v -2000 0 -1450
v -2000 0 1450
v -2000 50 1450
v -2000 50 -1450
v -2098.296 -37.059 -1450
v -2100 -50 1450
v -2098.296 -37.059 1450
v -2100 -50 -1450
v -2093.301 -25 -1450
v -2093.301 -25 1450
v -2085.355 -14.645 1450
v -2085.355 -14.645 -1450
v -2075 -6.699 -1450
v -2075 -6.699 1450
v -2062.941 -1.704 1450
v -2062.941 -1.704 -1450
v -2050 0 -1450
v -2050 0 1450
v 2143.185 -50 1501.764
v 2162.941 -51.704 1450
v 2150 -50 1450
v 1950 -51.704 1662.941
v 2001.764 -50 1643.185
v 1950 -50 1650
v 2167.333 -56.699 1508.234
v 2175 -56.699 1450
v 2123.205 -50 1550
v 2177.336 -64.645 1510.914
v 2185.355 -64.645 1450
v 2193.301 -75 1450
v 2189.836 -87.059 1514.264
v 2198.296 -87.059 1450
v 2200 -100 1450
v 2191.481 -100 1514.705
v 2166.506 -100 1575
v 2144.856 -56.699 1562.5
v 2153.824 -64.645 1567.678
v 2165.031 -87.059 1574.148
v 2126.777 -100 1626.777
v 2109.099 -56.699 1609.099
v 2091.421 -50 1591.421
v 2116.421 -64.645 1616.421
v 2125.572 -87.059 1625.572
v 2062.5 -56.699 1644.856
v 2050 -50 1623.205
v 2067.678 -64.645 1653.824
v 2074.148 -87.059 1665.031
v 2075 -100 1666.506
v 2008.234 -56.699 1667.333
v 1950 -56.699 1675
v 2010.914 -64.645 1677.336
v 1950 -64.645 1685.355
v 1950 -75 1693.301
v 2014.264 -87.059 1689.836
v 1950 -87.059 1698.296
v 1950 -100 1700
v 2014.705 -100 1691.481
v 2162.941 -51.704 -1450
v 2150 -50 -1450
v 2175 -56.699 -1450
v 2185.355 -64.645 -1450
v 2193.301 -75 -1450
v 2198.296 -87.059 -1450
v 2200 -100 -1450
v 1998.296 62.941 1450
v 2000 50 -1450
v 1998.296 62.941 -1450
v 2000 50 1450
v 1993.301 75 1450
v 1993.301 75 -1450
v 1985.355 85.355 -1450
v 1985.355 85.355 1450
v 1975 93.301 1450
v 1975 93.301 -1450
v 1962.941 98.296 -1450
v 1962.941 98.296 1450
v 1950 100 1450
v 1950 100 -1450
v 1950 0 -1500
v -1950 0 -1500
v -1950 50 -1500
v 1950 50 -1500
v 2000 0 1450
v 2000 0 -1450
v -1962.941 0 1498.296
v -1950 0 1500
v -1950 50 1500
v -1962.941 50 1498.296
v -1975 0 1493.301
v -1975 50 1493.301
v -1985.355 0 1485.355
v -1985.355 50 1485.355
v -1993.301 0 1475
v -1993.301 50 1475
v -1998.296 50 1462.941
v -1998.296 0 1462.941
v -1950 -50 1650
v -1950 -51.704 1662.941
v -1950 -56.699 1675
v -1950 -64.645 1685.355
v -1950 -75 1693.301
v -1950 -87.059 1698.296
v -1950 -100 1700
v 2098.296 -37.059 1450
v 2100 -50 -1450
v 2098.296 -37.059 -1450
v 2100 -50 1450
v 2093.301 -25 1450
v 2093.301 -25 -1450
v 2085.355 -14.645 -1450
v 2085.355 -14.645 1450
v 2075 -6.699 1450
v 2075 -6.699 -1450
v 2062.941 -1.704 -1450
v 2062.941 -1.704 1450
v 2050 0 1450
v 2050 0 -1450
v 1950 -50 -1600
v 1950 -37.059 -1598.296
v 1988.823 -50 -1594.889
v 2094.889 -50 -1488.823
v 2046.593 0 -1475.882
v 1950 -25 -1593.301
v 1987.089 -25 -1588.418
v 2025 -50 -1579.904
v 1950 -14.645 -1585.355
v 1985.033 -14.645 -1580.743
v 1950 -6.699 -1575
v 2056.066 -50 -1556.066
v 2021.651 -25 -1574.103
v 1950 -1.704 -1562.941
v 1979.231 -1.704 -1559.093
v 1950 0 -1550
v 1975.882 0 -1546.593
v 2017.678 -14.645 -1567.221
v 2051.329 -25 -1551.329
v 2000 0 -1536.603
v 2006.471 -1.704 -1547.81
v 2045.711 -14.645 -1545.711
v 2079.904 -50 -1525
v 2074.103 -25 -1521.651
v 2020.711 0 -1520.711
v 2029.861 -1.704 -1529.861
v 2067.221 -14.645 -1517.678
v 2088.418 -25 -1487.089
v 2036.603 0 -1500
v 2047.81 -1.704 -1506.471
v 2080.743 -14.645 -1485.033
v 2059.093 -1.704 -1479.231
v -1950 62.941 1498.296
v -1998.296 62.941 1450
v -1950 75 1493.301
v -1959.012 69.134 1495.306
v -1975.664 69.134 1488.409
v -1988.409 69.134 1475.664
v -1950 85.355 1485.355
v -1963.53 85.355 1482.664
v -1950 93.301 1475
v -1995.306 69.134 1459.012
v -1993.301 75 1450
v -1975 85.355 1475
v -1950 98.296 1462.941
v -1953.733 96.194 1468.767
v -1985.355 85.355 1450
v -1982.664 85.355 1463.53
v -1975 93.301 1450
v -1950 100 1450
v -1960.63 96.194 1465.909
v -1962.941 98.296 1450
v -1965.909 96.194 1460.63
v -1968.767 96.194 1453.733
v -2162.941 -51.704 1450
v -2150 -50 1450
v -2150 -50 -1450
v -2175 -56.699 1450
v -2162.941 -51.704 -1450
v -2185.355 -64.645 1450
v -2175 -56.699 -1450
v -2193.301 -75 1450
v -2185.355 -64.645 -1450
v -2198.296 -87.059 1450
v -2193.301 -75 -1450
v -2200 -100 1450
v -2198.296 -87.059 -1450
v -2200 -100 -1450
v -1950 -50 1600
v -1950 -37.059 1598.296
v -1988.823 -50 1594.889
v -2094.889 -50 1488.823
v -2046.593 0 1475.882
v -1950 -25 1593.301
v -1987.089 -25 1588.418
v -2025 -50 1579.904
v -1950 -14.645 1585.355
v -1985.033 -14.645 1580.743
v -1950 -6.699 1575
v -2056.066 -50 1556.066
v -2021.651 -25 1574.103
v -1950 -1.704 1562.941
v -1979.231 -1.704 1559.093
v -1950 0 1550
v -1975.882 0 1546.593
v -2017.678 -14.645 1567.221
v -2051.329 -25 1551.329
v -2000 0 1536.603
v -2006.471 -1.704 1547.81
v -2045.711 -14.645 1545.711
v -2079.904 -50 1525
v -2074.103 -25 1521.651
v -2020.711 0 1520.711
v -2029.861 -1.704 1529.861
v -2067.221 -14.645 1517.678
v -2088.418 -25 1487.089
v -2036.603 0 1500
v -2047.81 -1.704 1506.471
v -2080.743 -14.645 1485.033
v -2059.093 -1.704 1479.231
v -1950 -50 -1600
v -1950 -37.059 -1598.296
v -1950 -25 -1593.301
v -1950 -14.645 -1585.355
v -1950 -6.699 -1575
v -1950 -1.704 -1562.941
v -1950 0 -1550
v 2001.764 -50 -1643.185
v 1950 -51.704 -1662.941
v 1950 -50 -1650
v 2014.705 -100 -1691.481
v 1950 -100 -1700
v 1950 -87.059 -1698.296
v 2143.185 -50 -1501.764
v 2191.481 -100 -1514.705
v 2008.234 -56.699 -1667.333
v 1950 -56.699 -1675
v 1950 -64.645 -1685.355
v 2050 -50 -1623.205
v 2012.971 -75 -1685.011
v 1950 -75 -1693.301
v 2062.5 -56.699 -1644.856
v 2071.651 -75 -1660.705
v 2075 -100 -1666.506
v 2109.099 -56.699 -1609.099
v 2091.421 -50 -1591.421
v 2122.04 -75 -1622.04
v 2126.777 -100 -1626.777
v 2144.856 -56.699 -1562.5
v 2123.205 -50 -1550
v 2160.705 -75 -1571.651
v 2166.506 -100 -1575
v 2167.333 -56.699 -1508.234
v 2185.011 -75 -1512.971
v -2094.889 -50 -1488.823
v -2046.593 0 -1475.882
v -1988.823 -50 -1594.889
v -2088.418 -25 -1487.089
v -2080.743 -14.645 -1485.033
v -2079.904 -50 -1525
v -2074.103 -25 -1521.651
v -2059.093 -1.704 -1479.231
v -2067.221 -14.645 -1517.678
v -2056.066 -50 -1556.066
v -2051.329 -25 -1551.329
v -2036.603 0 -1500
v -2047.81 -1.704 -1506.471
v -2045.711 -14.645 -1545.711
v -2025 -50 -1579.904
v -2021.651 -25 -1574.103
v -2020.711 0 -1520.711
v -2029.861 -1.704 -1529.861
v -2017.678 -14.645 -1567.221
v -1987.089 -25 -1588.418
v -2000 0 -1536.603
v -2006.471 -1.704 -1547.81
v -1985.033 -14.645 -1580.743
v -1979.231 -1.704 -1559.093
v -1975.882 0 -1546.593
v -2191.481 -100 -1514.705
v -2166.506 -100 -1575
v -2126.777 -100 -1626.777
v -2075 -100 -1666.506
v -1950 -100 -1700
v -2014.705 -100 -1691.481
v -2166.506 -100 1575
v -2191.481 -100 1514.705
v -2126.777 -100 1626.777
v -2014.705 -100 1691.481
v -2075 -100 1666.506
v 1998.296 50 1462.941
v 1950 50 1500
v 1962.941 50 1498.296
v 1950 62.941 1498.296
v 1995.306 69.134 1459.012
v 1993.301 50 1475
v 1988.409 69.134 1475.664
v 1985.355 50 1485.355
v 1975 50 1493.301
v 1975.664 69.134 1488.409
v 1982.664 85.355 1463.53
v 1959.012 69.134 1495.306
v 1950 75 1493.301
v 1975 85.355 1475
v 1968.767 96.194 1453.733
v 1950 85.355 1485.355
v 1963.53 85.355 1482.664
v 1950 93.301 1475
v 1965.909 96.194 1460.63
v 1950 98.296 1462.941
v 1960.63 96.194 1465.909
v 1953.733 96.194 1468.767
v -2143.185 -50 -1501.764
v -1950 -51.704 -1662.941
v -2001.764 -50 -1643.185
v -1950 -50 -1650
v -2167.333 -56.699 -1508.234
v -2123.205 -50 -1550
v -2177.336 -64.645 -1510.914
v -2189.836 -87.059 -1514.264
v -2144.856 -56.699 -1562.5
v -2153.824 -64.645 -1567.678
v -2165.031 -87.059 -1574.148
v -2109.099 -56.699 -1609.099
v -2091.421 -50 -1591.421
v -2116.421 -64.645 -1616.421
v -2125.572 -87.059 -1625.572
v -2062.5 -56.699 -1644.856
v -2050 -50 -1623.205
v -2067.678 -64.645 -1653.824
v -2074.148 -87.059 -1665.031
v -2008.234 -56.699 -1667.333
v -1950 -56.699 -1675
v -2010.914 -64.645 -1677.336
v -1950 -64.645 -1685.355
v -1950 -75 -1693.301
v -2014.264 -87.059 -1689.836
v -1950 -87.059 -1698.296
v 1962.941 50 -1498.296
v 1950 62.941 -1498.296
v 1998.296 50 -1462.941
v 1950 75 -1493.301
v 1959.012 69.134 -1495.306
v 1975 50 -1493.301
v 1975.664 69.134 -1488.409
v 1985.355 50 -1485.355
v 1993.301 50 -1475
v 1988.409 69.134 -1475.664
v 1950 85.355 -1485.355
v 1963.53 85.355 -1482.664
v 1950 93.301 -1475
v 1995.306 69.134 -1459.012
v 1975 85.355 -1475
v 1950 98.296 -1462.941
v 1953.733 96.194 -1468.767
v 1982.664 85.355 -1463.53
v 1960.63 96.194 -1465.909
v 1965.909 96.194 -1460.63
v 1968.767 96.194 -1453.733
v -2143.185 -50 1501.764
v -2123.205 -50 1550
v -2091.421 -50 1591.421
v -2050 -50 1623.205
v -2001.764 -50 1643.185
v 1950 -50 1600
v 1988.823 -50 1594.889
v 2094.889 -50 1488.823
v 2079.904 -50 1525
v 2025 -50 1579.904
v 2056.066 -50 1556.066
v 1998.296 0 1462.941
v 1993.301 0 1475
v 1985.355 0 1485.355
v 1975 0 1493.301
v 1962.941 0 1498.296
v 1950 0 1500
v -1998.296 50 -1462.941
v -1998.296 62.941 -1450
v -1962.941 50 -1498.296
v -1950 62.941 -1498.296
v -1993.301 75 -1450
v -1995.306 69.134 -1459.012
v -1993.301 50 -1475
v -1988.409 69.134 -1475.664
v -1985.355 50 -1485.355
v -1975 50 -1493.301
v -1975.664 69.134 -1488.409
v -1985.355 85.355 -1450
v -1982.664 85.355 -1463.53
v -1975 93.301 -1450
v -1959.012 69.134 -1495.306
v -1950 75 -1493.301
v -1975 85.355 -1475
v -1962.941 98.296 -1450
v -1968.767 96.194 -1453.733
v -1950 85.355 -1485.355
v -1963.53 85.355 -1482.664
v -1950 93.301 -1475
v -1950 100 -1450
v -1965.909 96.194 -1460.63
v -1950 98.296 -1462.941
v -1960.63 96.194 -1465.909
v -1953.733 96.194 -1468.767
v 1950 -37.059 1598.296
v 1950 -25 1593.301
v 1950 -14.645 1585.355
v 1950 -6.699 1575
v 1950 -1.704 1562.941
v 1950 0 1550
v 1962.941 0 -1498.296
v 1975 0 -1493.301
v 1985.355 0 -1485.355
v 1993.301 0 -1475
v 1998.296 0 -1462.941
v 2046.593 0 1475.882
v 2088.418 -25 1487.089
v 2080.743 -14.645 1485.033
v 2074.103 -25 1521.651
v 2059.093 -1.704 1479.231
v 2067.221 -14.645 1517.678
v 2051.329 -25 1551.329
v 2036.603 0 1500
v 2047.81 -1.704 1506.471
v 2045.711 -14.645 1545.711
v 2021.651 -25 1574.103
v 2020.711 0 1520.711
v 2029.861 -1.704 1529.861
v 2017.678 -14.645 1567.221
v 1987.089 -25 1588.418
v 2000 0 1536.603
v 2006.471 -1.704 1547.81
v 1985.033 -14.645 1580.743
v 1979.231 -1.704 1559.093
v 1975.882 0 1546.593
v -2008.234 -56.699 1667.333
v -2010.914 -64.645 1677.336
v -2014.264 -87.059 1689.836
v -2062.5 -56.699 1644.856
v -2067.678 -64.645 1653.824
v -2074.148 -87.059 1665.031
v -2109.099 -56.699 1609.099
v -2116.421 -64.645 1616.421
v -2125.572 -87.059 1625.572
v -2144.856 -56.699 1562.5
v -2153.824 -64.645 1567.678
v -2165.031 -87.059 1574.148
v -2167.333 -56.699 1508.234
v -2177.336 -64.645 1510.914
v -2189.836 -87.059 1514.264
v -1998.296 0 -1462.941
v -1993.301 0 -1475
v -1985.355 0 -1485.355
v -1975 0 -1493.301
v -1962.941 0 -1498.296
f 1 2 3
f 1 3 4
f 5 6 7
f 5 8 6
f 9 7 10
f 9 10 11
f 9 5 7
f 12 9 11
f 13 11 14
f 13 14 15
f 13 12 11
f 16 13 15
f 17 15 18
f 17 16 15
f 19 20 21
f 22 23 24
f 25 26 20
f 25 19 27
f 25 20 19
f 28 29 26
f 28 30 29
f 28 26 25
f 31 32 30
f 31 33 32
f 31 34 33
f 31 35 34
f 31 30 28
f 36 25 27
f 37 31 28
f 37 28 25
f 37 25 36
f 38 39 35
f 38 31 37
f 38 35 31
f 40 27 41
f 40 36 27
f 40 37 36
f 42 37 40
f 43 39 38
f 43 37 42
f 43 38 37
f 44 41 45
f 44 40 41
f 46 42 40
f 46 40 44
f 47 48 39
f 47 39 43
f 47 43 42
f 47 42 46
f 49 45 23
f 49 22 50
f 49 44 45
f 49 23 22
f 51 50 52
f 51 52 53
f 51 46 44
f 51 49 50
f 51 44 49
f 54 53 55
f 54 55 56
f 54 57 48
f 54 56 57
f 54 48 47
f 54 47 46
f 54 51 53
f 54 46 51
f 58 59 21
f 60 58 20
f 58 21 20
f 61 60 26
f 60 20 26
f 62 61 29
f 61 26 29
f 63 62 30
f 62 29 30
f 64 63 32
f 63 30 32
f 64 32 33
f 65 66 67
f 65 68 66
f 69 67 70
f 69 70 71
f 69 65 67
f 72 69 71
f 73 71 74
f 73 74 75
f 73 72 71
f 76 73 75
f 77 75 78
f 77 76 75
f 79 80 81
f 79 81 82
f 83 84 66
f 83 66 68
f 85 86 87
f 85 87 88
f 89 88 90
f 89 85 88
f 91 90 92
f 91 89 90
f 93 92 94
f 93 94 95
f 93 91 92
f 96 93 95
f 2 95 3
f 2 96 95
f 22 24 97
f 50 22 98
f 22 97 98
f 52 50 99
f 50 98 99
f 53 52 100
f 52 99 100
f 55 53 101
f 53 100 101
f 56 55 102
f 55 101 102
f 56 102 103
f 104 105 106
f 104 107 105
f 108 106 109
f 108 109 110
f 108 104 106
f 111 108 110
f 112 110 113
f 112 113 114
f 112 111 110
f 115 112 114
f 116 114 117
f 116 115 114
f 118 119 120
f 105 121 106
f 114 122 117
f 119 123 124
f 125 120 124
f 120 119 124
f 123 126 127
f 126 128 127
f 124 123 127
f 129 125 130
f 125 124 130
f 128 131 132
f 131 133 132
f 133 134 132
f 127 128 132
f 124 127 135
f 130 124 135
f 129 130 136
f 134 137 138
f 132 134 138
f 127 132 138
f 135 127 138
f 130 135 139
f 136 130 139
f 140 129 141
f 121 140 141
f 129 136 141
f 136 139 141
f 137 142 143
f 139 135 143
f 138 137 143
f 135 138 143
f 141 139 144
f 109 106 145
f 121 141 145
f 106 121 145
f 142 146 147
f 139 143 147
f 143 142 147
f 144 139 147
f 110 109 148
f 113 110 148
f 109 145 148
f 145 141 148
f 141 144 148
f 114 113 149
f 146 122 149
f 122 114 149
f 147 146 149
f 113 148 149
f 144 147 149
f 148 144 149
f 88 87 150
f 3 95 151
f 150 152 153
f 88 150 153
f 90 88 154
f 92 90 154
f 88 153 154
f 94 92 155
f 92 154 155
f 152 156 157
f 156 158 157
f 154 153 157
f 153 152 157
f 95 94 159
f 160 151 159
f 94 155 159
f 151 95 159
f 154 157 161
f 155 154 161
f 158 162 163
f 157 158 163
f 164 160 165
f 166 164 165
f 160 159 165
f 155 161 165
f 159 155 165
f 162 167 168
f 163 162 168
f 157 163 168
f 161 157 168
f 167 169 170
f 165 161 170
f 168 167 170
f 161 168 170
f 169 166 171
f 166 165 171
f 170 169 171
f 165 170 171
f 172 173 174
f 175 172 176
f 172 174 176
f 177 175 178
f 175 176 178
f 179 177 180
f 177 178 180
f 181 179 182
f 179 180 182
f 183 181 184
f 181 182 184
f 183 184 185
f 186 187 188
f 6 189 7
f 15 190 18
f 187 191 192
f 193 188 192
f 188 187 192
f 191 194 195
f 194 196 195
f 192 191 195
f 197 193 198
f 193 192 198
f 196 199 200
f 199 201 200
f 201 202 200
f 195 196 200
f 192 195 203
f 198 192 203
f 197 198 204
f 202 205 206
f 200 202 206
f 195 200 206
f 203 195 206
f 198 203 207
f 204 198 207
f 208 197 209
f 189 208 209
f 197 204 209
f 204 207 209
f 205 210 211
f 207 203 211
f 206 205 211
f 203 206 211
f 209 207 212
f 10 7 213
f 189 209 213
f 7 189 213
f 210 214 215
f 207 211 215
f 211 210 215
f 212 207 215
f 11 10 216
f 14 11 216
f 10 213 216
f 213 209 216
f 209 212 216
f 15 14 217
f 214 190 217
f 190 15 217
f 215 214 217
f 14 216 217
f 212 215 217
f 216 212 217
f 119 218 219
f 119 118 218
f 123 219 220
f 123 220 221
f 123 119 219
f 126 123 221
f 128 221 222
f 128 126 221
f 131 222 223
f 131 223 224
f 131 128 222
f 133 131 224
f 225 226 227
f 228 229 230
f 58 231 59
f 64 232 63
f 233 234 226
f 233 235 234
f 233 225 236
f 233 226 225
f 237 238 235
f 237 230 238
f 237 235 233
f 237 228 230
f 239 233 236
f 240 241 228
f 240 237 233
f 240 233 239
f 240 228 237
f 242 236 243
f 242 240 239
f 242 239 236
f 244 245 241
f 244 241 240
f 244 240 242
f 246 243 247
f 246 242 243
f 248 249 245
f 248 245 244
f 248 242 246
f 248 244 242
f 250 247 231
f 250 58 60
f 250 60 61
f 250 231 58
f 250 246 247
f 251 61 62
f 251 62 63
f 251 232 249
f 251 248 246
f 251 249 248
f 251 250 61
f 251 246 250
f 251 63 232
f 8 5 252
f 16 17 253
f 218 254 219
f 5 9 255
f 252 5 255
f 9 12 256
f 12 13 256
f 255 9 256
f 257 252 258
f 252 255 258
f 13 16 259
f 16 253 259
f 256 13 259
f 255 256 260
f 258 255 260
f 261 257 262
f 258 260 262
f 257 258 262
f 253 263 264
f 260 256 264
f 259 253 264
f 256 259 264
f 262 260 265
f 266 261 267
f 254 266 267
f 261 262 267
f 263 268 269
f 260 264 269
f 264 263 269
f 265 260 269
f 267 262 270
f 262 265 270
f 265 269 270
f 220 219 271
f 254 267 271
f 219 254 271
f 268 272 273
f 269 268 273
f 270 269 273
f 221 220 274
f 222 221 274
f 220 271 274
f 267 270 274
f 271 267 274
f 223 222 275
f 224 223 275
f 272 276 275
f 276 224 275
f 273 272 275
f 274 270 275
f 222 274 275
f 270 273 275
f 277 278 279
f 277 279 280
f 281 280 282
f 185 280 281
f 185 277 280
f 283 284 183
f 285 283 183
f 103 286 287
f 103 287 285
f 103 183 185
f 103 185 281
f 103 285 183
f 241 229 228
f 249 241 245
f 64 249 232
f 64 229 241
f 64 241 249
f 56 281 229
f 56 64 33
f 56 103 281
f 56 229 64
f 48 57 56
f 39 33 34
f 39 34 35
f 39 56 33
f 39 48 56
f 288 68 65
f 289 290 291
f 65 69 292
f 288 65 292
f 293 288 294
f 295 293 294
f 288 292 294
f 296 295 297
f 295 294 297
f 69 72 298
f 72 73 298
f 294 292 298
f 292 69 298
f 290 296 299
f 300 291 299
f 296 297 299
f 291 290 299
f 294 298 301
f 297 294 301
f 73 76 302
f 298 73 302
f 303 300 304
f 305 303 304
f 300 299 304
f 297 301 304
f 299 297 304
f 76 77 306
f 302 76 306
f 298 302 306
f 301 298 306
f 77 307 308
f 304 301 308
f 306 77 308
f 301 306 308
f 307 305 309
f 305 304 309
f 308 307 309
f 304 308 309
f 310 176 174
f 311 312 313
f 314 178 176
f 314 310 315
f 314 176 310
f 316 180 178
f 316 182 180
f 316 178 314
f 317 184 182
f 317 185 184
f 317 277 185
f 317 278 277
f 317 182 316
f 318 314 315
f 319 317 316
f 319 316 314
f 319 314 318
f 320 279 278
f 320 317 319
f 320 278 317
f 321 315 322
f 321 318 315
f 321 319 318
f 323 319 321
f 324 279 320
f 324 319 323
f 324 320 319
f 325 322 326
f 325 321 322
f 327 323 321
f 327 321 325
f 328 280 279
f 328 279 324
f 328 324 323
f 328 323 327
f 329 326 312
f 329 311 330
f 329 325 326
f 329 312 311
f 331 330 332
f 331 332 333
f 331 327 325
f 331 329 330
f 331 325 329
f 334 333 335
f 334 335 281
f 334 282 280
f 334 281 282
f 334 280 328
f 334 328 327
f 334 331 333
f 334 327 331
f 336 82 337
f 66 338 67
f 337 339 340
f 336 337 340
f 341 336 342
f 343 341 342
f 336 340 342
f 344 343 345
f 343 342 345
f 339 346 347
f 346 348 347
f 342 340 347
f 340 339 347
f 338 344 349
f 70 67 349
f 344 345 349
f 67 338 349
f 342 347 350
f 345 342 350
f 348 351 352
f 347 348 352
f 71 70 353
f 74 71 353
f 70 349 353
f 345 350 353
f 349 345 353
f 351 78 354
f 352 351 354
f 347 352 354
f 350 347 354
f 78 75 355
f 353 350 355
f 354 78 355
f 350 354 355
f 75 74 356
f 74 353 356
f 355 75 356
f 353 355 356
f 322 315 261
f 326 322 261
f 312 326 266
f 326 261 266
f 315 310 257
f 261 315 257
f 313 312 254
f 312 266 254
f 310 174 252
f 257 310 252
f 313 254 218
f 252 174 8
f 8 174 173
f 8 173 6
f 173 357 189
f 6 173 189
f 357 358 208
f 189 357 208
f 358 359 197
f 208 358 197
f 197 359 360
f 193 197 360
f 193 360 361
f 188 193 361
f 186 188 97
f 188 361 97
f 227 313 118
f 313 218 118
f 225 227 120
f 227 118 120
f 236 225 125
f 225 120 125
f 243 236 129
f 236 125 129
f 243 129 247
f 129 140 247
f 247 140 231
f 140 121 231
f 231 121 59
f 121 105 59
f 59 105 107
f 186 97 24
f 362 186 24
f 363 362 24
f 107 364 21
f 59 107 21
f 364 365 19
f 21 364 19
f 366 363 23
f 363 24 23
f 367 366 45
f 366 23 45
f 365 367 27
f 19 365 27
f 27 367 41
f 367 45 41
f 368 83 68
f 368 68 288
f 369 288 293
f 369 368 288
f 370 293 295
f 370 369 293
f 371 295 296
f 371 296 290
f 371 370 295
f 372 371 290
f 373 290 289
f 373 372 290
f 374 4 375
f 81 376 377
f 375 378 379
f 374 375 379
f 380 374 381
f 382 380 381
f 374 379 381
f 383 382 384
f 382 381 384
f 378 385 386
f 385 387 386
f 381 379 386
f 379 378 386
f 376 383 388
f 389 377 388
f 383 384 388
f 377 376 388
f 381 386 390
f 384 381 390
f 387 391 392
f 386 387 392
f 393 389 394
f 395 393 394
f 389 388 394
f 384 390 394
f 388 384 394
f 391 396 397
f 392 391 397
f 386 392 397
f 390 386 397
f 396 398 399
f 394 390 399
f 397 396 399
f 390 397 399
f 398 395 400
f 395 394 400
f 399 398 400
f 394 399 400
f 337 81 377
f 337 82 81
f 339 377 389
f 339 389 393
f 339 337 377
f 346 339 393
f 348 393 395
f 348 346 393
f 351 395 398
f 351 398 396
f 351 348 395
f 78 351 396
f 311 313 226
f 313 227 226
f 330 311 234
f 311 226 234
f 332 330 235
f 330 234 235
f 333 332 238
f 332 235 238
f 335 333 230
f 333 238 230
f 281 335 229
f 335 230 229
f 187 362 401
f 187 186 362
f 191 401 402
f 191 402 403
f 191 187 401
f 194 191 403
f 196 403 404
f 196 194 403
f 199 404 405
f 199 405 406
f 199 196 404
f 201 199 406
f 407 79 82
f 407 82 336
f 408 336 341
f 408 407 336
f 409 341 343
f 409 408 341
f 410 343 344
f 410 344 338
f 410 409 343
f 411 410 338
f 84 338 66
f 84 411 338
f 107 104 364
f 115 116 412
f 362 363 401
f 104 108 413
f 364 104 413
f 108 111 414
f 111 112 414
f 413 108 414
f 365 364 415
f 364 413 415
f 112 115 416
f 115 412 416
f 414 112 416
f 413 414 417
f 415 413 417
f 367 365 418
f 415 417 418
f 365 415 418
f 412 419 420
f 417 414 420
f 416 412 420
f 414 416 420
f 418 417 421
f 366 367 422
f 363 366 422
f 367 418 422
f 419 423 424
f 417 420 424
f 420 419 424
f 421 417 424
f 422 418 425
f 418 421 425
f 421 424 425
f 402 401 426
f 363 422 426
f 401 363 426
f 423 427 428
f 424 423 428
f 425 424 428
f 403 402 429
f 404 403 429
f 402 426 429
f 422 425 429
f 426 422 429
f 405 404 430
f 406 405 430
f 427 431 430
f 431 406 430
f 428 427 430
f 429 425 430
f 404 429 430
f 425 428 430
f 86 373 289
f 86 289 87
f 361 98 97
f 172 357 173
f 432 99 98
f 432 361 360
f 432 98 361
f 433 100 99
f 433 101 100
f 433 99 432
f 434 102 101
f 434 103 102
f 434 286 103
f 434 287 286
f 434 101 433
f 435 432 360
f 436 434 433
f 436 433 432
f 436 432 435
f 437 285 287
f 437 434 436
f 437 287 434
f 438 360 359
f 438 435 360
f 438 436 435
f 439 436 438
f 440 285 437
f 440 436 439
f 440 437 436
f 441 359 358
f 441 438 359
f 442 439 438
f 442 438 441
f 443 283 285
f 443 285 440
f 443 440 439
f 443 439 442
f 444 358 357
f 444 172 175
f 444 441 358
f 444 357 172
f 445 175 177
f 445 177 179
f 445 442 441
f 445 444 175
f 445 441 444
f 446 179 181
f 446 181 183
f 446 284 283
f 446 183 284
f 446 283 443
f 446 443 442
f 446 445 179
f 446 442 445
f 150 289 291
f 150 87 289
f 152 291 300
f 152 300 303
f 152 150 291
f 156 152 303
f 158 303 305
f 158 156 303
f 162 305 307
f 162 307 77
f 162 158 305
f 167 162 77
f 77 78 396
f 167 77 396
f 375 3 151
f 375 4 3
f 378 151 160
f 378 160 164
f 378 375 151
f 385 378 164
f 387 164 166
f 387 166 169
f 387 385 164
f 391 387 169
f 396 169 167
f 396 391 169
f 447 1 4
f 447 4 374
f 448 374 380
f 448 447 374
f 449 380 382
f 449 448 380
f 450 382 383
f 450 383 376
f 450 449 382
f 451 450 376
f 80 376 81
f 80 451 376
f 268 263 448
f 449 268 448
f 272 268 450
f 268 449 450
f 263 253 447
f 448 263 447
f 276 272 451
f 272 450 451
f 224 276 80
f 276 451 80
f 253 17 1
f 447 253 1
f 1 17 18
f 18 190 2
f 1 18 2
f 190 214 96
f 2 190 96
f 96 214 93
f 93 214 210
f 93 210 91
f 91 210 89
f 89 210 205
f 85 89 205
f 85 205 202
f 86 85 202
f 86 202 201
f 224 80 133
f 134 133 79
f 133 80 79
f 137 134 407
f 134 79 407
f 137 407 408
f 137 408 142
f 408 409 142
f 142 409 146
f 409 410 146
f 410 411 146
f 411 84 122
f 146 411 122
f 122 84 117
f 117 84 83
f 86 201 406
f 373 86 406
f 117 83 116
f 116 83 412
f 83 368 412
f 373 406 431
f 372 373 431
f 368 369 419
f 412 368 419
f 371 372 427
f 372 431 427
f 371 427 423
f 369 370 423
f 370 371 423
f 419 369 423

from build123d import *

# Parameters (mm, degrees)
BOSS_EXTRUDE1_DEPTH = 100
FILLET1_R           = 50
BOSS_EXTRUDE2_START = 50
BOSS_EXTRUDE2_DEPTH = 50
BOSS_EXTRUDE3_START = 50
BOSS_EXTRUDE3_DEPTH = 50
FILLET2_R           = 50


with BuildPart() as part:
    # Sketch1 → Boss-Extrude1 (new body)
    with BuildSketch(Plane(origin=(0, 0, 0), x_dir=(1, 0, 0), z_dir=(0, 1, 0))):
        with BuildLine():
            Line((-1950, 1500), (1950, 1500))
            ThreePointArc((1950, 1500), (1985.355339059, 1485.355339059), (2000, 1450))
            Line((2000, 1450), (2000, -1450))
            ThreePointArc((2000, -1450), (1985.355339059, -1485.355339059), (1950, -1500))
            Line((1950, -1500), (-1950, -1500))
            ThreePointArc((-1950, -1500), (-1985.355339059, -1485.355339059), (-2000, -1450))
            Line((-2000, -1450), (-2000, 1450))
            ThreePointArc((-2000, 1450), (-1985.355339059, 1485.355339059), (-1950, 1500))
        make_face()
    extrude(amount=BOSS_EXTRUDE1_DEPTH)

    # Fillet1
    fillet1_edges = [part.edges().sort_by_distance(p)[0] for p in [
        (-1985.355339059, 100, -1485.355339059),
        (-2000, 100, 0),
        (-1985.355339059, 100, 1485.355339059),
        (0, 100, 1500),
        (1985.355339059, 100, 1485.355339059),
        (2000, 100, 0),
        (1985.355339059, 100, -1485.355339059),
        (0, 100, -1500),
    ]]
    fillet(fillet1_edges, radius=FILLET1_R)

    # Sketch2 → Boss-Extrude2 (add)
    # profile 1 of 2: a face of its own
    with BuildSketch(Plane.XZ.offset(BOSS_EXTRUDE2_START)):
        with BuildLine():
            Line((1950, 1600), (-1950, 1600))
            ThreePointArc((-1950, 1600), (-2056.066017178, 1556.066017178), (-2100, 1450))
            Line((-2100, 1450), (-2100, -1450))
            ThreePointArc((-2100, -1450), (-2056.066017178, -1556.066017178), (-1950, -1600))
            Line((-1950, -1600), (1950, -1600))
            ThreePointArc((1950, -1600), (2056.066017178, -1556.066017178), (2100, -1450))
            Line((2100, -1450), (2100, 1450))
            ThreePointArc((2100, 1450), (2056.066017178, 1556.066017178), (1950, 1600))
        make_face()
        with BuildLine():
            ThreePointArc((1950, -1500), (1985.355339059, -1485.355339059), (2000, -1450))
            Line((2000, -1450), (2000, 1450))
            ThreePointArc((2000, 1450), (1985.355339059, 1485.355339059), (1950, 1500))
            Line((1950, 1500), (-1950, 1500))
            ThreePointArc((-1950, 1500), (-1985.355339059, 1485.355339059), (-2000, 1450))
            Line((-2000, 1450), (-2000, -1450))
            ThreePointArc((-2000, -1450), (-1985.355339059, -1485.355339059), (-1950, -1500))
            Line((-1950, -1500), (1950, -1500))
        make_face(mode=Mode.SUBTRACT)
    # profile 2 of 2: a face of its own
    with BuildSketch(Plane.XZ.offset(BOSS_EXTRUDE2_START)):
        with BuildLine():
            Line((-1950, -1500), (1950, -1500))
            ThreePointArc((1950, -1500), (1985.355339059, -1485.355339059), (2000, -1450))
            Line((2000, -1450), (2000, 1450))
            ThreePointArc((2000, 1450), (1985.355339059, 1485.355339059), (1950, 1500))
            Line((1950, 1500), (-1950, 1500))
            ThreePointArc((-1950, 1500), (-1985.355339059, 1485.355339059), (-2000, 1450))
            Line((-2000, 1450), (-2000, -1450))
            ThreePointArc((-2000, -1450), (-1985.355339059, -1485.355339059), (-1950, -1500))
        make_face()
    extrude(amount=-BOSS_EXTRUDE2_DEPTH)

    # Sketch3 → Boss-Extrude3 (add)
    # profile 1 of 2: a face of its own
    with BuildSketch(Plane.XZ.offset(50).offset(BOSS_EXTRUDE3_START)):
        with BuildLine():
            Line((1950, 1700), (-1950, 1700))
            ThreePointArc((-1950, 1700), (-2126.776695297, 1626.776695297), (-2200, 1450))
            Line((-2200, 1450), (-2200, -1450))
            ThreePointArc((-2200, -1450), (-2126.776695297, -1626.776695297), (-1950, -1700))
            Line((-1950, -1700), (1950, -1700))
            ThreePointArc((1950, -1700), (2126.776695297, -1626.776695297), (2200, -1450))
            Line((2200, -1450), (2200, 1450))
            ThreePointArc((2200, 1450), (2126.776695297, 1626.776695297), (1950, 1700))
        make_face()
        with BuildLine():
            Line((1950, 1600), (-1950, 1600))
            ThreePointArc((-1950, 1600), (-2056.066017178, 1556.066017178), (-2100, 1450))
            Line((-2100, 1450), (-2100, -1450))
            ThreePointArc((-2100, -1450), (-2056.066017178, -1556.066017178), (-1950, -1600))
            Line((-1950, -1600), (1950, -1600))
            ThreePointArc((1950, -1600), (2056.066017178, -1556.066017178), (2100, -1450))
            Line((2100, -1450), (2100, 1450))
            ThreePointArc((2100, 1450), (2056.066017178, 1556.066017178), (1950, 1600))
        make_face(mode=Mode.SUBTRACT)
    # profile 2 of 2: a face of its own
    with BuildSketch(Plane.XZ.offset(50).offset(BOSS_EXTRUDE3_START)):
        with BuildLine():
            ThreePointArc((2100, 1450), (2056.066017178, 1556.066017178), (1950, 1600))
            Line((1950, 1600), (-1950, 1600))
            ThreePointArc((-1950, 1600), (-2056.066017178, 1556.066017178), (-2100, 1450))
            Line((-2100, 1450), (-2100, -1450))
            ThreePointArc((-2100, -1450), (-2056.066017178, -1556.066017178), (-1950, -1600))
            Line((-1950, -1600), (1950, -1600))
            ThreePointArc((1950, -1600), (2056.066017178, -1556.066017178), (2100, -1450))
            Line((2100, -1450), (2100, 1450))
        make_face()
    extrude(amount=-BOSS_EXTRUDE3_DEPTH)

    # Fillet2
    fillet2_edges = [part.edges().sort_by_distance(p)[0] for p in [
        (2126.776695297, -50, -1626.776695297),
        (0, -50, -1700),
        (-2126.776695297, -50, -1626.776695297),
        (-2200, -50, 0),
        (-2126.776695297, -50, 1626.776695297),
        (0, -50, 1700),
        (2126.776695297, -50, 1626.776695297),
        (2056.066017178, 0, -1556.066017178),
        (0, 0, -1600),
        (-2056.066017178, 0, -1556.066017178),
        (-2100, 0, 0),
        (-2056.066017178, 0, 1556.066017178),
        (0, 0, 1600),
        (2056.066017178, 0, 1556.066017178),
        (2200, -50, 0),
        (2100, 0, 0),
    ]]
    fillet(fillet2_edges, radius=FILLET2_R - 0.0001)  # a hair under: the kernel refuses the full size


solid = part.part
